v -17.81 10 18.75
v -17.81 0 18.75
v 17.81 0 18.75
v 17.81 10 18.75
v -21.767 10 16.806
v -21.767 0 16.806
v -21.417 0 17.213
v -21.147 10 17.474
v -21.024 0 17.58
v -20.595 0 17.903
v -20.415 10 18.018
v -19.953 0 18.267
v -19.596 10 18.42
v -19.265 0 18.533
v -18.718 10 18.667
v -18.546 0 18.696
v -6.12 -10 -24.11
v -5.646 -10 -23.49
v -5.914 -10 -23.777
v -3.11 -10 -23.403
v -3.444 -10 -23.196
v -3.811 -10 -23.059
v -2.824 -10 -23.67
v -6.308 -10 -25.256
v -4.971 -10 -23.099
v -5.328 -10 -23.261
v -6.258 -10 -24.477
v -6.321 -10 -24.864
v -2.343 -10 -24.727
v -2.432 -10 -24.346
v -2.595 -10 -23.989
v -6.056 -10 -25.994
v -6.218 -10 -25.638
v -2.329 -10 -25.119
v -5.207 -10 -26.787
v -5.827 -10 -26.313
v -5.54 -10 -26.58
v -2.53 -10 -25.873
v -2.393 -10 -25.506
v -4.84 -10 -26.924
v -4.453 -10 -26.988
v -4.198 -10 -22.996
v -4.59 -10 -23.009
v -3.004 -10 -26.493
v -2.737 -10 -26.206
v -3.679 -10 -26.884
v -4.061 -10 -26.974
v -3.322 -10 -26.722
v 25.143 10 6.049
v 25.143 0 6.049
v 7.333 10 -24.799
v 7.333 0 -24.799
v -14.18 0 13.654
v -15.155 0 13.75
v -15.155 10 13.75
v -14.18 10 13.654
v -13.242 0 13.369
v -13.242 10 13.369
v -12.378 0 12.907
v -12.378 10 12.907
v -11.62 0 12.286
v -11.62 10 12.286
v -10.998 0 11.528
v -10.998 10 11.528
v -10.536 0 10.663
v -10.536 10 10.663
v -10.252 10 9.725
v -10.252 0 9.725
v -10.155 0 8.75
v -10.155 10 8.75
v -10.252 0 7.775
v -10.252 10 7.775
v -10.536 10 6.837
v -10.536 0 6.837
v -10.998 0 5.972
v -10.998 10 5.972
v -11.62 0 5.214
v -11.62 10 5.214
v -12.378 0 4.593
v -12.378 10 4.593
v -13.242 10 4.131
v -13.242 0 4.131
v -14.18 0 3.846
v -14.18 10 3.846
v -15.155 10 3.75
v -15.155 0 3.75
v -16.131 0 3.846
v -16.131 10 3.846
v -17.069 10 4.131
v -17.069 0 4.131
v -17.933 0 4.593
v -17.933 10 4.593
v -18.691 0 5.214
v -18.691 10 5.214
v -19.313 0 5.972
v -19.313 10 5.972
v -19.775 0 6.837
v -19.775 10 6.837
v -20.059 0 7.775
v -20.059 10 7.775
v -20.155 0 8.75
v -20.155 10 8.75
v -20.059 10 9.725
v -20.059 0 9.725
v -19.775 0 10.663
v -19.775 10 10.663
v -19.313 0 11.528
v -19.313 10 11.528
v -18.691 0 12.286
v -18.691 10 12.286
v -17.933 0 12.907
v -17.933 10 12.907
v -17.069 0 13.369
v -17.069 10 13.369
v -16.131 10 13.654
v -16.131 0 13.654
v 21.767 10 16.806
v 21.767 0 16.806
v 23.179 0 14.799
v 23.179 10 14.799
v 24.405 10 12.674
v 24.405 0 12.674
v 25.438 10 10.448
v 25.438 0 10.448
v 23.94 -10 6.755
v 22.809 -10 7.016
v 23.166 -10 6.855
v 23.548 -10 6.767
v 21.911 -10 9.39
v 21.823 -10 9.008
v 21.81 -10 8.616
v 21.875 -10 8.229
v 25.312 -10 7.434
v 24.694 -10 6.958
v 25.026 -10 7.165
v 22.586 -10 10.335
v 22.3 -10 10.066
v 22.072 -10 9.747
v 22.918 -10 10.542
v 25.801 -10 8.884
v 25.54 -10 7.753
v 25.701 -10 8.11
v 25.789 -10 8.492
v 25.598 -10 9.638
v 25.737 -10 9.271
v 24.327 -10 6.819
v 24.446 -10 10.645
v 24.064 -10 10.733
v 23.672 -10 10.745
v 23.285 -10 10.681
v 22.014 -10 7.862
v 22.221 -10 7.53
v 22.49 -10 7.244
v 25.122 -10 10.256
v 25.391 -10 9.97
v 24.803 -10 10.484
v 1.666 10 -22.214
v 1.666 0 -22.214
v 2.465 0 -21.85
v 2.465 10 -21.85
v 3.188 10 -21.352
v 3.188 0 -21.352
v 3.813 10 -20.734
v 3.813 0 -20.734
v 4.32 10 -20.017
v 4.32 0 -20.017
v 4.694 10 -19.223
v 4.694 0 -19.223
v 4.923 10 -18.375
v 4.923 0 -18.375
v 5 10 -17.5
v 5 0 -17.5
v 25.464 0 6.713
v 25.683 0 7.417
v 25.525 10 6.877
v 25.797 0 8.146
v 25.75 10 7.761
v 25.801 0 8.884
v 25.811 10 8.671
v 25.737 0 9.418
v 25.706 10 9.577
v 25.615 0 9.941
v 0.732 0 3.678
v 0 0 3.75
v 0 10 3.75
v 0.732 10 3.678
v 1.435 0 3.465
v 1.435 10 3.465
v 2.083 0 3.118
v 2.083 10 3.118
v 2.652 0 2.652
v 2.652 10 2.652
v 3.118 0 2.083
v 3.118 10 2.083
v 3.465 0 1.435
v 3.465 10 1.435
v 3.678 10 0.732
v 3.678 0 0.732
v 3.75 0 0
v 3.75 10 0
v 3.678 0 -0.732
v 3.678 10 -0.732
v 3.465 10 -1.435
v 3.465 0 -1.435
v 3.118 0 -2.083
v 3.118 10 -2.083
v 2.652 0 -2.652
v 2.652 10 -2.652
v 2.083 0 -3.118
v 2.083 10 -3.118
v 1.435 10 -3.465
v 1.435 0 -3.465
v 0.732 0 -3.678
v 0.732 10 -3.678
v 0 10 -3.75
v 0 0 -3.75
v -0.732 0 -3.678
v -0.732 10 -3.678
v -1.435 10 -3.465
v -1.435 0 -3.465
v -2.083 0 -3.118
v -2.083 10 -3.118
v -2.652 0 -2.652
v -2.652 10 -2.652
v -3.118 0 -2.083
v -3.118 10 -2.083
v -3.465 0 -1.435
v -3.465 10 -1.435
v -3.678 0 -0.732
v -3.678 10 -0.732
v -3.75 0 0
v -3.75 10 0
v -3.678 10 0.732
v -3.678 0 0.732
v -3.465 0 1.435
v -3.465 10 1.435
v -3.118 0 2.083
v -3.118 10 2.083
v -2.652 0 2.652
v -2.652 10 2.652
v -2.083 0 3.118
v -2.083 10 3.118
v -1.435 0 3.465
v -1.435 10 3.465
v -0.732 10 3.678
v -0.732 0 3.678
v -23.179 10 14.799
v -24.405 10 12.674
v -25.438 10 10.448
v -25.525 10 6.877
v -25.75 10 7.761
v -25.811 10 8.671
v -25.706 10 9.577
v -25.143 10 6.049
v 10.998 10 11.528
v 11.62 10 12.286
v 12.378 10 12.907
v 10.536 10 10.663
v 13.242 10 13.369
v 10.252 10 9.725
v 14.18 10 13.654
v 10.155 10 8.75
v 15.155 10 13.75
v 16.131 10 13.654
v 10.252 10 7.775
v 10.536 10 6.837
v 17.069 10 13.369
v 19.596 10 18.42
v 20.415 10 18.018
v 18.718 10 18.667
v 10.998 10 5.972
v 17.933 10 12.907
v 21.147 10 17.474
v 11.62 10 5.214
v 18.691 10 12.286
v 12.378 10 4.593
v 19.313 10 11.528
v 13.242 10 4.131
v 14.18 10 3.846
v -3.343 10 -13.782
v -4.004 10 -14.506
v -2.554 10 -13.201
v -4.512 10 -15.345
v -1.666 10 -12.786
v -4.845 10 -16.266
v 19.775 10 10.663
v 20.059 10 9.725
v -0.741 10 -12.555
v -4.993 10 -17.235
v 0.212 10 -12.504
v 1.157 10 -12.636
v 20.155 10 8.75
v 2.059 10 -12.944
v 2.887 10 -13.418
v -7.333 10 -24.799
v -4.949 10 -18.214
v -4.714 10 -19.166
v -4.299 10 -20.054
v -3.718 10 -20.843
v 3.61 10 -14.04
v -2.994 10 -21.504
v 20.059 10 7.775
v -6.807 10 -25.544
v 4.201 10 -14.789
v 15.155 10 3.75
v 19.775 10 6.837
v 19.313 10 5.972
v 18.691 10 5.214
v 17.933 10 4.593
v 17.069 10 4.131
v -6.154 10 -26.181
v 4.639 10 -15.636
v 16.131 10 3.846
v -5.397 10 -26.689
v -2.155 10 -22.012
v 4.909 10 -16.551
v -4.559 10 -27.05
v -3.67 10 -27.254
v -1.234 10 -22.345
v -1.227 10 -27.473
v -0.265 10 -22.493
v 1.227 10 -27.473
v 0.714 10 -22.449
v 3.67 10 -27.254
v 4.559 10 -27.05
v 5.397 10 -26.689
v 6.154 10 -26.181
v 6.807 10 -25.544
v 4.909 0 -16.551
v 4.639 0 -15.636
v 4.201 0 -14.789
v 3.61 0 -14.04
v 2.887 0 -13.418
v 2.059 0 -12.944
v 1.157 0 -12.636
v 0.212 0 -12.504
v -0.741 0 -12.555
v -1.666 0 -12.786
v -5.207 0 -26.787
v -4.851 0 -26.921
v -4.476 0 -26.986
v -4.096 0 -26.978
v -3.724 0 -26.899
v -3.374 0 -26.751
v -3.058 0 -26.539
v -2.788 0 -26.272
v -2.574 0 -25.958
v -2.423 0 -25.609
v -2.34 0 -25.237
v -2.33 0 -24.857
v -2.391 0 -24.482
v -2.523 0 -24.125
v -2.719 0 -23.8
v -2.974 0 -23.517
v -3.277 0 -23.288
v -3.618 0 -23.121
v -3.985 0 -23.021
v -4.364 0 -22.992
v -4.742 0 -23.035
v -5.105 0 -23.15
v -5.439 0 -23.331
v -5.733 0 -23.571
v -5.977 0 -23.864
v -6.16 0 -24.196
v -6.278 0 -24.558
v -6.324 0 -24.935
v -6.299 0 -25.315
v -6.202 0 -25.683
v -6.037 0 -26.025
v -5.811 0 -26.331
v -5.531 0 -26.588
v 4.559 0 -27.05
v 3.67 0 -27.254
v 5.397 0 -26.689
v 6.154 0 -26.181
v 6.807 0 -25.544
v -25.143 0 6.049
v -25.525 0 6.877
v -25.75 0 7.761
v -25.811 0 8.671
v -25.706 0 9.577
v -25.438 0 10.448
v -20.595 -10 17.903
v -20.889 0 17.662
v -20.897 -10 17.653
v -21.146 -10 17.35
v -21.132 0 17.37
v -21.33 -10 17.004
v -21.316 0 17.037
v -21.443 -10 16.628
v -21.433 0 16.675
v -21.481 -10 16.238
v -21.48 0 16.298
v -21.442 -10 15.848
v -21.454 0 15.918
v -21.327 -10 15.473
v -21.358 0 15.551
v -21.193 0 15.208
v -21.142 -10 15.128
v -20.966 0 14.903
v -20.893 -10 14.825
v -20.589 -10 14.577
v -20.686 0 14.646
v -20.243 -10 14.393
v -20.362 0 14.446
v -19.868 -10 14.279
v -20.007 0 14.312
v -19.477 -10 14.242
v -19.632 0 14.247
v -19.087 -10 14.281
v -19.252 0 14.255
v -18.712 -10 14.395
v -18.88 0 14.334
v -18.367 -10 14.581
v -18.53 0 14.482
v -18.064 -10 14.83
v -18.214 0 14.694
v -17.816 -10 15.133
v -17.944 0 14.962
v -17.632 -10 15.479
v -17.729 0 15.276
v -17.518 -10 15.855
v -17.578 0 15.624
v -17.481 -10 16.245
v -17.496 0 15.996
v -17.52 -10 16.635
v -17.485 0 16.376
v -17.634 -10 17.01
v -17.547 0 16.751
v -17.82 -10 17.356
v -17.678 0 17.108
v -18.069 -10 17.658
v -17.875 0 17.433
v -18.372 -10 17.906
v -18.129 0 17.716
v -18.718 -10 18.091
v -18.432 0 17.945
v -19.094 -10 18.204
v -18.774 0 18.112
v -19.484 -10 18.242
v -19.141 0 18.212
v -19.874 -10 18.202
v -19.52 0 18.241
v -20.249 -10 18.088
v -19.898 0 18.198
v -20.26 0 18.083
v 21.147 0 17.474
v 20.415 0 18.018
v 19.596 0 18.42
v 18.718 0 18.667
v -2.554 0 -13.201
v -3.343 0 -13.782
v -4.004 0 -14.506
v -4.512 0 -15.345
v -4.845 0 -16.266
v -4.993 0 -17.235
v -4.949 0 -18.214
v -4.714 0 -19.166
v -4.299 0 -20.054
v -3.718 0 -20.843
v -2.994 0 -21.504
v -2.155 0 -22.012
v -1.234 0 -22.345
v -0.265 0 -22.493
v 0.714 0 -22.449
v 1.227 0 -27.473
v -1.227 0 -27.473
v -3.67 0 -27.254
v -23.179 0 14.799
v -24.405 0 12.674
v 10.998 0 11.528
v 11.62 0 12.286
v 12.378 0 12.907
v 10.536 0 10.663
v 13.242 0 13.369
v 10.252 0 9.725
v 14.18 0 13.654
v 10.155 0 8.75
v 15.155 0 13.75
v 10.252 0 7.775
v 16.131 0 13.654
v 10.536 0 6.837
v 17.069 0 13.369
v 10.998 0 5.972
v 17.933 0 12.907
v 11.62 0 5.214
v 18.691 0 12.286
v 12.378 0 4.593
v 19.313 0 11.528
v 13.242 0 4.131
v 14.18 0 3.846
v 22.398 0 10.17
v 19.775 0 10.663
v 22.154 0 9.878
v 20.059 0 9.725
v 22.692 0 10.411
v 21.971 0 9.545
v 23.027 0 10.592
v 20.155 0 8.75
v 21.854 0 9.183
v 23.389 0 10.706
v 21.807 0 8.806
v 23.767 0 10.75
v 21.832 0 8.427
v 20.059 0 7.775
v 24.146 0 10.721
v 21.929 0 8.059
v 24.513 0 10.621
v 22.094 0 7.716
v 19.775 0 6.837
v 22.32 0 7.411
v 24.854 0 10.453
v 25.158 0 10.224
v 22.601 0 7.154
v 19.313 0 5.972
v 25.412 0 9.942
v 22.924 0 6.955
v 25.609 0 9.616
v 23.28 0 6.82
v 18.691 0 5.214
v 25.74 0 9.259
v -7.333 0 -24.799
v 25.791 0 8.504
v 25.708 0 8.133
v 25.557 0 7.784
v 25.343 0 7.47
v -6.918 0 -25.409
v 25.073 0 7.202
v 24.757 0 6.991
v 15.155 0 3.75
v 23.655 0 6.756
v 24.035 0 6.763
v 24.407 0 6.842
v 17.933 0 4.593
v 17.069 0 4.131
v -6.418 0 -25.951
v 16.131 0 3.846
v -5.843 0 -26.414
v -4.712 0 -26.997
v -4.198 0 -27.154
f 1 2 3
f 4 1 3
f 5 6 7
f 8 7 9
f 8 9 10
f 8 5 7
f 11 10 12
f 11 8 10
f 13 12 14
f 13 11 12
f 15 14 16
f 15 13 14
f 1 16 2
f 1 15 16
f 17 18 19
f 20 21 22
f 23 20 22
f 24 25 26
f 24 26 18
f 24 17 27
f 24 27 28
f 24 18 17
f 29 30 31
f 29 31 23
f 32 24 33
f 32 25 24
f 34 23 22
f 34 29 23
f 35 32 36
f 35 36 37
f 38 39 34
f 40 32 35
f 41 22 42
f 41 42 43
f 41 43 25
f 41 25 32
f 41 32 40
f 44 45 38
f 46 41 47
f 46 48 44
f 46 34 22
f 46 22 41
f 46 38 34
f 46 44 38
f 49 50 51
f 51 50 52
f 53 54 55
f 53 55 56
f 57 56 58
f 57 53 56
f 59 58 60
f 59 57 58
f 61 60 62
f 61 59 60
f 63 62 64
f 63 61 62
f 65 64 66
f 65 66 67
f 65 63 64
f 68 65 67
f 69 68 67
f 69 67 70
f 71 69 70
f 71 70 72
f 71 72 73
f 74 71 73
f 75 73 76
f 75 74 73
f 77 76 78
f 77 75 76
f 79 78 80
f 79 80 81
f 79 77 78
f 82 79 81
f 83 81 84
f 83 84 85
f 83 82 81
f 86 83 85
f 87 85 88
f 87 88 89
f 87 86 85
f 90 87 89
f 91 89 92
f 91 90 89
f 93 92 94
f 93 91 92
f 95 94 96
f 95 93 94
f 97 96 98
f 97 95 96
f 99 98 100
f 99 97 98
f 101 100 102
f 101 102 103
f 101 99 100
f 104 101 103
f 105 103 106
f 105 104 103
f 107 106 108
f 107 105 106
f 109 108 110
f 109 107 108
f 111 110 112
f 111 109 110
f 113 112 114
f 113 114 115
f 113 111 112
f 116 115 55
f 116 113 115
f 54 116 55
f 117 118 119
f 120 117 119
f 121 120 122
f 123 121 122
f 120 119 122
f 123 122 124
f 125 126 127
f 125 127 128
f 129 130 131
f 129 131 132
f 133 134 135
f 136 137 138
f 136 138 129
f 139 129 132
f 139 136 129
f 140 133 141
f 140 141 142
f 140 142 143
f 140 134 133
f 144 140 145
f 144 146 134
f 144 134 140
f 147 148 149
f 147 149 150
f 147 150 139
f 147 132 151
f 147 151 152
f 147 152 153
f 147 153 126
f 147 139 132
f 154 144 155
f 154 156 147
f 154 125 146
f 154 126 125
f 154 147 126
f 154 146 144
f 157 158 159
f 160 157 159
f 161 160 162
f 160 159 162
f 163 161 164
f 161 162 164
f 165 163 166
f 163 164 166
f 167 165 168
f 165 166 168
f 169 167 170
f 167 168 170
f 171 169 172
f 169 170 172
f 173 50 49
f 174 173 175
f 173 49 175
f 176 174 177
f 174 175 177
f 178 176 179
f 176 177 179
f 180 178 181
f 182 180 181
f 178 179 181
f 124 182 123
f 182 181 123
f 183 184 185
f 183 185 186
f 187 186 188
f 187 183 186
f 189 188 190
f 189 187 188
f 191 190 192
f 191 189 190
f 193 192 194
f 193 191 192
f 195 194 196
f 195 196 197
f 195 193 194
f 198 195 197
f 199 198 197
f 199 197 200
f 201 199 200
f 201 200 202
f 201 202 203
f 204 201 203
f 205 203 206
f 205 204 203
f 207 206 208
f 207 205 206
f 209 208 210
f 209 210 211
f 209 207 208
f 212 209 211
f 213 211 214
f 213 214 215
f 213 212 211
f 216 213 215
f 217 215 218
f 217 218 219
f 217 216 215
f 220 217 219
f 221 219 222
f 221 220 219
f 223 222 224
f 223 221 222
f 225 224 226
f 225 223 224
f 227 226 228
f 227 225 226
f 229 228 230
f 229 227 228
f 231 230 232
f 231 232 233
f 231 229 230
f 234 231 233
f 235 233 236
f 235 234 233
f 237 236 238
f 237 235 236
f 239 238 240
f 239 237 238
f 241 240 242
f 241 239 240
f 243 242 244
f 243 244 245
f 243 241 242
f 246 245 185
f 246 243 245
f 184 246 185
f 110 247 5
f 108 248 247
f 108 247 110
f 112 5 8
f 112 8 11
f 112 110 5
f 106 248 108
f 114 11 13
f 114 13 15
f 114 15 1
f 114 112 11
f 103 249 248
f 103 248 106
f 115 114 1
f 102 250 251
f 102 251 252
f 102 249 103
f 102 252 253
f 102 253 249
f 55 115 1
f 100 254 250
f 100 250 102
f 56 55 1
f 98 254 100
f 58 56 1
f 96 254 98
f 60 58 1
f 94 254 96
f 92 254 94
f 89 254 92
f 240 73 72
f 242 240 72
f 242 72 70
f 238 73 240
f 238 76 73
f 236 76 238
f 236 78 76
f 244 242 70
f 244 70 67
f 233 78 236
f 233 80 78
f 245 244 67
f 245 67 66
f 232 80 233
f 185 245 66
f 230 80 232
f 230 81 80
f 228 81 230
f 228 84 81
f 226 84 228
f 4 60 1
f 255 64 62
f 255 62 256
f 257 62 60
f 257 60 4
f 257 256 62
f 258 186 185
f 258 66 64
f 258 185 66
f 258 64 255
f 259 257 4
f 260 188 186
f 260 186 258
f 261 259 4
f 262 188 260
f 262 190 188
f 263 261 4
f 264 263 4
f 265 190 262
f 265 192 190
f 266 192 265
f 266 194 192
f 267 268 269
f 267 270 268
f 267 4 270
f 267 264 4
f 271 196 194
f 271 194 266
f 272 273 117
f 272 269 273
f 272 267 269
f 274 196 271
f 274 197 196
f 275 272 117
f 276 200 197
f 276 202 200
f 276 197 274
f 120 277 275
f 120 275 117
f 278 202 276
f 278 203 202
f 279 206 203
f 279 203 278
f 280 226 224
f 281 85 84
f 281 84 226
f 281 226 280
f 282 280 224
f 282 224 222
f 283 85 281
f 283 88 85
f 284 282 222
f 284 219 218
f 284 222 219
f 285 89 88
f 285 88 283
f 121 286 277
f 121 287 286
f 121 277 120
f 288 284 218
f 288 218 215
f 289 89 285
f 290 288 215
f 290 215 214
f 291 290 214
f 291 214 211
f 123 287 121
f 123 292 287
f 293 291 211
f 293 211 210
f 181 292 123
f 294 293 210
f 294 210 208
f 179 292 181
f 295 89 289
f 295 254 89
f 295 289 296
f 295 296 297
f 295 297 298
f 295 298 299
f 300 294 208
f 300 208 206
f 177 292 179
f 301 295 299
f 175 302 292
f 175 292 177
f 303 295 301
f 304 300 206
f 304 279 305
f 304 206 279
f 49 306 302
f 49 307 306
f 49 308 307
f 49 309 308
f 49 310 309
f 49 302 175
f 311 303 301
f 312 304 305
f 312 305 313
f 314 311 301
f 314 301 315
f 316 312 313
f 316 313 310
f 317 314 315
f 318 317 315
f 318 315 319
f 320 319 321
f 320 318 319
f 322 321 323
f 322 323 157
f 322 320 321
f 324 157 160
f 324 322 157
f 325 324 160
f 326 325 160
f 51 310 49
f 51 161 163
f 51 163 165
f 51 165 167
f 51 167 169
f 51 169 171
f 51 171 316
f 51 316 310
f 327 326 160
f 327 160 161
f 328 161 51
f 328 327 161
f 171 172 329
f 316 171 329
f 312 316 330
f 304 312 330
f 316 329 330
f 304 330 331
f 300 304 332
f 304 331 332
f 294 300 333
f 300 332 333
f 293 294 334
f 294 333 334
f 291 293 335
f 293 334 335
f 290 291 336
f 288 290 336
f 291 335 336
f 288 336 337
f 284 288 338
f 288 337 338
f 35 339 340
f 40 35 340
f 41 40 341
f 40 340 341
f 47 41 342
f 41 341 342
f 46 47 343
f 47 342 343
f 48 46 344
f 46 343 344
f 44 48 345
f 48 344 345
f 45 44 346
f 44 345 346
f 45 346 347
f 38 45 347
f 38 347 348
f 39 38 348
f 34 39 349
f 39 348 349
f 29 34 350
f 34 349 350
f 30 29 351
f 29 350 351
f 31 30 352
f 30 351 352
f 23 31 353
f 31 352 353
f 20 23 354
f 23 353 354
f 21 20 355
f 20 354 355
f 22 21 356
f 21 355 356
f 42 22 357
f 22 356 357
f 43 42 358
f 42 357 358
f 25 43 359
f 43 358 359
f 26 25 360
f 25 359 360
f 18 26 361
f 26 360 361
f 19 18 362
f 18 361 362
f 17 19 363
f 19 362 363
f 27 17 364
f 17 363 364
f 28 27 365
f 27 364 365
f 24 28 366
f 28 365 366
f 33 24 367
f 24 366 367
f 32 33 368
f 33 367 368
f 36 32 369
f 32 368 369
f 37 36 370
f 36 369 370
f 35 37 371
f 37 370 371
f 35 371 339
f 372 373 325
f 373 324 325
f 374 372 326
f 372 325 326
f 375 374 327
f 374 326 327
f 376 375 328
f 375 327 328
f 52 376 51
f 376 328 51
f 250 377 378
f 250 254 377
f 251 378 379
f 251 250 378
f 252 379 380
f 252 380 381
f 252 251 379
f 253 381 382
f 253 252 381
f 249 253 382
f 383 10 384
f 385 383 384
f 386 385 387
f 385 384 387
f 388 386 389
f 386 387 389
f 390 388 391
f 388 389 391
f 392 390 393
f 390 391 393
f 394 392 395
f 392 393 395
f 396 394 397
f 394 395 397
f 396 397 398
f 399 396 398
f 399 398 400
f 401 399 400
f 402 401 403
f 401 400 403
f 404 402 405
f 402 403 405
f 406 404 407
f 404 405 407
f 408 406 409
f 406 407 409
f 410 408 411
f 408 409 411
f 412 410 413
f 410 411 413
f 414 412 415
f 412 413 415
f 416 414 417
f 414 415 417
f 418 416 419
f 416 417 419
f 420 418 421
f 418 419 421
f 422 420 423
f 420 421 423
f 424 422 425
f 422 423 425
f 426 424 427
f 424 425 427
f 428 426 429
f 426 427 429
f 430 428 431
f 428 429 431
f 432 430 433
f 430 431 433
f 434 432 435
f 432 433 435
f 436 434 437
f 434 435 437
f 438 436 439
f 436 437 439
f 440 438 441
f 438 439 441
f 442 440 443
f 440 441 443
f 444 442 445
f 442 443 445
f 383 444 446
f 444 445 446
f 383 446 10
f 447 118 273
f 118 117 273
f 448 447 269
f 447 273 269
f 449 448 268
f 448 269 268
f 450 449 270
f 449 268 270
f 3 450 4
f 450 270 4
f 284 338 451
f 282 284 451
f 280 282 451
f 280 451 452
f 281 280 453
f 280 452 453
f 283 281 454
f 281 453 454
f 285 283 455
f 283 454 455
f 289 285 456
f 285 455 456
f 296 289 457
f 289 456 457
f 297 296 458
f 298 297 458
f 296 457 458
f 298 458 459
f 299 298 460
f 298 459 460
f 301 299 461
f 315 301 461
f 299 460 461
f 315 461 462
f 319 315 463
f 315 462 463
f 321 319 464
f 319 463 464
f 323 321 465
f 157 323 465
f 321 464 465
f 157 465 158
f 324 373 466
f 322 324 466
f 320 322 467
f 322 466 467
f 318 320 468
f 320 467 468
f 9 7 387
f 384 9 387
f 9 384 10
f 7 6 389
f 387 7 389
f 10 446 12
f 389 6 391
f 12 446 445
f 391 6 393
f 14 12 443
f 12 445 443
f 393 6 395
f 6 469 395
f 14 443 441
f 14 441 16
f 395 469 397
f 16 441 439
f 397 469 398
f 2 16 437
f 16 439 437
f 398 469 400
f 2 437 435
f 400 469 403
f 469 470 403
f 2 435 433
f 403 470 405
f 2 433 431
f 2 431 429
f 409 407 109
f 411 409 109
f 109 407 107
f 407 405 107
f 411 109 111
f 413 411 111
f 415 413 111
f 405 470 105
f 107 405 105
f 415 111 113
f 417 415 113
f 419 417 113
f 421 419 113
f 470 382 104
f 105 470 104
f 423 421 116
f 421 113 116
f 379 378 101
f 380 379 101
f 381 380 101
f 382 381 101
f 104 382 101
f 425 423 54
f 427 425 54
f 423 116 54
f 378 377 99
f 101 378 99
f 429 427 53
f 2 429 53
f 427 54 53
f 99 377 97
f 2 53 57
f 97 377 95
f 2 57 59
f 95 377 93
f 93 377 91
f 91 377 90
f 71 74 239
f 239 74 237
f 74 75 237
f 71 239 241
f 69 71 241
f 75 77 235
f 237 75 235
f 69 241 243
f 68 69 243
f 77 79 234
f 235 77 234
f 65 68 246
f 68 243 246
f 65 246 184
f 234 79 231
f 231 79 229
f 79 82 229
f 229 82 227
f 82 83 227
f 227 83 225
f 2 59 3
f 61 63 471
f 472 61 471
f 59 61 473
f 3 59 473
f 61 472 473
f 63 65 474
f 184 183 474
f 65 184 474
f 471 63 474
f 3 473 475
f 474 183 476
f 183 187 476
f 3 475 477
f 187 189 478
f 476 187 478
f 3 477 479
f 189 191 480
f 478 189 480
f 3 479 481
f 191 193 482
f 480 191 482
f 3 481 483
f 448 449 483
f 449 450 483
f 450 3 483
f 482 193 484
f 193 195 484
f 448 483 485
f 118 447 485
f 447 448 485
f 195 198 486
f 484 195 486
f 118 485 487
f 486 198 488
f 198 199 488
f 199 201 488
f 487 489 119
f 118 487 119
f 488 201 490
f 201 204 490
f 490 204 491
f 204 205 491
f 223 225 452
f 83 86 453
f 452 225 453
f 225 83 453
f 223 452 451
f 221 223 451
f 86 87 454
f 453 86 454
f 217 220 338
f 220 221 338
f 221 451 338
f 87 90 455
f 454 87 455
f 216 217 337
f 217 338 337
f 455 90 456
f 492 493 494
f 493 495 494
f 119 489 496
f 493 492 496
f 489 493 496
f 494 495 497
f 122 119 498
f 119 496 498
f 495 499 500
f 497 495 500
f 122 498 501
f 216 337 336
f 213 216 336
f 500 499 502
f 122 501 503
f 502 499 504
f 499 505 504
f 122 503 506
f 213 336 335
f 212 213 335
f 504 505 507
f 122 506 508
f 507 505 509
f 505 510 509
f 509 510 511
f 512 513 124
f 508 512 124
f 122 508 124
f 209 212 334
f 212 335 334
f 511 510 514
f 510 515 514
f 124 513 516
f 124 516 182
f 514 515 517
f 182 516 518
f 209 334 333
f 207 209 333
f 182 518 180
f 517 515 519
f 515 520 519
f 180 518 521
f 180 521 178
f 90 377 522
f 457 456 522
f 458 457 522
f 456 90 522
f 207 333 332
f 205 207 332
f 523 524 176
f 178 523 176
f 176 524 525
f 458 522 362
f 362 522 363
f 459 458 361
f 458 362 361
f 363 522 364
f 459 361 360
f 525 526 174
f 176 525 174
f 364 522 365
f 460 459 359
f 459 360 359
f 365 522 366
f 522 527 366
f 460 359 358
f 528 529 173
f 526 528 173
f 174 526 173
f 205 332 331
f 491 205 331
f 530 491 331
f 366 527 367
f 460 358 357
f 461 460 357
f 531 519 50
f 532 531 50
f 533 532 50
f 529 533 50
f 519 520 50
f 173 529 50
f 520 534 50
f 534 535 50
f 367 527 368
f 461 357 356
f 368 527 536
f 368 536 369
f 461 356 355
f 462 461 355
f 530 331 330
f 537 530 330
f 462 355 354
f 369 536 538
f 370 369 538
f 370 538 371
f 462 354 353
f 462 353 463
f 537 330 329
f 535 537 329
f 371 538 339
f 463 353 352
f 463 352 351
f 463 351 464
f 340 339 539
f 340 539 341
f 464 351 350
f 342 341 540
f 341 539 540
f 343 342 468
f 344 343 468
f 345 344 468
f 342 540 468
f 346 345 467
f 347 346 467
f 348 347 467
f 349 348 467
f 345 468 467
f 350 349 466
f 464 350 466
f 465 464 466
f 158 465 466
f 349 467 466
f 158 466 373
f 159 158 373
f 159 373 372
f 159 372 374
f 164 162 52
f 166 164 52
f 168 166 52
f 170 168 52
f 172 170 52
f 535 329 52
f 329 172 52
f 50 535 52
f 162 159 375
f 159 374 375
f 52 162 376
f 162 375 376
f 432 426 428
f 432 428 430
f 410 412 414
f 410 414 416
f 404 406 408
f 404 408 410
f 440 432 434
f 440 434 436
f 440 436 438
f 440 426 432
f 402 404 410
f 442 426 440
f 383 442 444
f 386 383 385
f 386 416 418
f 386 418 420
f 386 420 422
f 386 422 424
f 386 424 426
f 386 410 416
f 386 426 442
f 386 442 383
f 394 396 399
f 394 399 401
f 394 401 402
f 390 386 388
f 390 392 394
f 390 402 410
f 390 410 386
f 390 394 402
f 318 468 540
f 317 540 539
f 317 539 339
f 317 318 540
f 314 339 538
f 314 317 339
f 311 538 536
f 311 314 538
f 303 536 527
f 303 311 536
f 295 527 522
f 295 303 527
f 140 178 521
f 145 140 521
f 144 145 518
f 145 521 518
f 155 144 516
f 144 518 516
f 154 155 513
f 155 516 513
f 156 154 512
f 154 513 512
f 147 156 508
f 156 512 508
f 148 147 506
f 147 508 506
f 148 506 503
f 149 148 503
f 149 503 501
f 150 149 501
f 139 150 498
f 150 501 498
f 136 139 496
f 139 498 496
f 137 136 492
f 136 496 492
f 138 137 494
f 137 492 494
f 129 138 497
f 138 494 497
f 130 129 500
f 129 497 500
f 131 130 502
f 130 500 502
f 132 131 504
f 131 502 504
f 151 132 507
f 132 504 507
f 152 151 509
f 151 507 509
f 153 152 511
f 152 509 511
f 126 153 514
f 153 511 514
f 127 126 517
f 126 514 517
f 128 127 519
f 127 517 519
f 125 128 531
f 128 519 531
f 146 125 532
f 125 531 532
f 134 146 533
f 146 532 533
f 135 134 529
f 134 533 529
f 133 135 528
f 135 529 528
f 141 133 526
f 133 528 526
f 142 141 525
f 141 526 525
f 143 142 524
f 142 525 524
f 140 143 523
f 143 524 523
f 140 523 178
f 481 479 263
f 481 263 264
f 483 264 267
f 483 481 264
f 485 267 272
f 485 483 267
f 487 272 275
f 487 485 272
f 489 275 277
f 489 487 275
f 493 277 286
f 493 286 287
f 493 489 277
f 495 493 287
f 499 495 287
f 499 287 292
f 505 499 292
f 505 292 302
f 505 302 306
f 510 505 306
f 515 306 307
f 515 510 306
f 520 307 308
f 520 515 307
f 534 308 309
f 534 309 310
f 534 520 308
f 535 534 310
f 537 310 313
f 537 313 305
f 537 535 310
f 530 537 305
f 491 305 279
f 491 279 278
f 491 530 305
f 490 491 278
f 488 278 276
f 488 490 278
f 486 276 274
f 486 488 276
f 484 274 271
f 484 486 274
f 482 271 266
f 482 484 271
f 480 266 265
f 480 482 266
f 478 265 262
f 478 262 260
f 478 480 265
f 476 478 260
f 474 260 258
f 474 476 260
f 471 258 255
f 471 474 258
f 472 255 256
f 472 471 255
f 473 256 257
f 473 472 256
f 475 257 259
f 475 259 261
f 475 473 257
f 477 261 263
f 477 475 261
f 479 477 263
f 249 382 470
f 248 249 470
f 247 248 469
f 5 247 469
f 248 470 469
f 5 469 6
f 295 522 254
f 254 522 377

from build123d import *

# Parameters (mm, degrees)
CROQUIS1_R              = 5
CROQUIS1_R_2            = 3.75
SALIENTE_EXTRUIR3_DEPTH = 10
REDONDEO3_R             = 5
CROQUIS3_R              = 2
SALIENTE_EXTRUIR4_DEPTH = 10


with BuildPart() as part:
    # Croquis1 → Saliente-Extruir3 (new body)
    # profile 1 of 5: a face of its own
    with BuildSketch(Plane(origin=(0, 0, 0), x_dir=(1, 0, 0), z_dir=(0, 1, 0))):
        with BuildLine():
            ThreePointArc((6.179553234, 26.796699831), (0, 27.5), (-6.179553234, 26.796699831))
            Line((-6.179553234, 26.796699831), (-26.296399408, -8.046699831))
            ThreePointArc((-26.296399408, -8.046699831), (-23.815698604, -13.75), (-20.116846174, -18.75))
            Line((-20.116846174, -18.75), (20.116846174, -18.75))
            ThreePointArc((20.116846174, -18.75), (23.815698604, -13.75), (26.296399408, -8.046699831))
            Line((26.296399408, -8.046699831), (6.179553234, 26.796699831))
        make_face()
        with Locations(Location((-15.155444566, -8.75, 0), (0, 0, 270))):
            Circle(CROQUIS1_R, mode=Mode.SUBTRACT)
        with Locations(Location((15.155444566, -8.75, 0), (0, 0, 270))):
            Circle(CROQUIS1_R, mode=Mode.SUBTRACT)
        with BuildLine():
            ThreePointArc((0, 7.5), (2.053290038, 7.406507449), (3.995190528, 8.080127019))
            ThreePointArc((3.995190528, 8.080127019), (1.58501754, 10.938896501), (-1.666208496, 12.785792829))
            ThreePointArc((-1.666208496, 12.785792829), (-4.714207171, 19.166208496), (1.666208496, 22.214207171))
            ThreePointArc((1.666208496, 22.214207171), (7.977102724, 18.629231149), (12.655444566, 13.080127019))
            Line((12.655444566, 13.080127019), (17.655444566, 4.419872981))
            Line((17.655444566, 4.419872981), (8.995190528, -0.580127019))
            ThreePointArc((8.995190528, -0.580127019), (7.440868623, -1.92505239), (6.495190528, -3.75))
            ThreePointArc((6.495190528, -3.75), (0, -6.171567416), (-6.495190528, -3.75))
            ThreePointArc((-6.495190528, -3.75), (-5.344734164, 3.085783708), (0, 7.5))
        make_face(mode=Mode.SUBTRACT)
    # profile 2 of 5: a face of its own
    with BuildSketch(Plane(origin=(0, 0, 0), x_dir=(1, 0, 0), z_dir=(0, 1, 0))):
        with BuildLine():
            ThreePointArc((0, 7.5), (5.344734164, 3.085783708), (6.495190528, -3.75))
            ThreePointArc((6.495190528, -3.75), (0, -6.171567416), (-6.495190528, -3.75))
            ThreePointArc((-6.495190528, -3.75), (-5.344734164, 3.085783708), (0, 7.5))
        make_face()
        with Locations(Location((0, 0, 0), (0, 0, 270))):
            Circle(CROQUIS1_R_2, mode=Mode.SUBTRACT)
    # profile 3 of 5: a face of its own
    with BuildSketch(Plane(origin=(0, 0, 0), x_dir=(1, 0, 0), z_dir=(0, 1, 0))):
        with BuildLine():
            ThreePointArc((8.995190528, -0.580127019), (7.440868623, -1.92505239), (6.495190528, -3.75))
            ThreePointArc((6.495190528, -3.75), (5.344734164, 3.085783708), (0, 7.5))
            ThreePointArc((0, 7.5), (2.053290038, 7.406507449), (3.995190528, 8.080127019))
            Line((3.995190528, 8.080127019), (8.995190528, -0.580127019))
        make_face()
    # profile 4 of 5: a face of its own
    with BuildSketch(Plane(origin=(0, 0, 0), x_dir=(1, 0, 0), z_dir=(0, 1, 0))):
        Polygon((17.655444566, 4.419872981), (8.995190528, -0.580127019), (3.995190528, 8.080127019), (12.655444566, 13.080127019), align=None)
    # profile 5 of 5: a face of its own
    with BuildSketch(Plane(origin=(0, 0, 0), x_dir=(1, 0, 0), z_dir=(0, 1, 0))):
        with BuildLine():
            ThreePointArc((-1.666208496, 12.785792829), (1.58501754, 10.938896501), (3.995190528, 8.080127019))
            Line((3.995190528, 8.080127019), (12.655444566, 13.080127019))
            ThreePointArc((12.655444566, 13.080127019), (7.977102724, 18.629231149), (1.666208496, 22.214207171))
            ThreePointArc((1.666208496, 22.214207171), (4.082342617, 20.386949733), (5, 17.5))
            ThreePointArc((5, 17.5), (2.886949733, 13.417657383), (-1.666208496, 12.785792829))
        make_face()
    extrude(amount=SALIENTE_EXTRUIR3_DEPTH)

    # Redondeo3
    redondeo3_edges = [part.edges().sort_by_distance(p)[0] for p in [
        (-20.116846174, 5, 18.75),
        (-26.296399408, 5, 8.046699831),
        (-6.179553234, 5, -26.796699831),
        (6.179553234, 5, -26.796699831),
        (26.296399408, 5, 8.046699831),
        (20.116846174, 5, 18.75),
    ]]
    fillet(redondeo3_edges, radius=REDONDEO3_R)

    # Croquis3 → Saliente-Extruir4 (add)
    with BuildSketch(Plane.XZ):
        with Locations(Location((23.805967574, 8.75, 0), (0, 0, 3.846633593))):
            Circle(CROQUIS3_R)
        with Locations(Location((-4.325261504, -24.99157268, 0), (0, 0, 243.846633832))):
            Circle(CROQUIS3_R)
        with Locations(Location((-19.48070607, 16.24157268, 0), (0, 0, 123.846633623))):
            Circle(CROQUIS3_R)
    extrude(amount=SALIENTE_EXTRUIR4_DEPTH)


solid = part.part
